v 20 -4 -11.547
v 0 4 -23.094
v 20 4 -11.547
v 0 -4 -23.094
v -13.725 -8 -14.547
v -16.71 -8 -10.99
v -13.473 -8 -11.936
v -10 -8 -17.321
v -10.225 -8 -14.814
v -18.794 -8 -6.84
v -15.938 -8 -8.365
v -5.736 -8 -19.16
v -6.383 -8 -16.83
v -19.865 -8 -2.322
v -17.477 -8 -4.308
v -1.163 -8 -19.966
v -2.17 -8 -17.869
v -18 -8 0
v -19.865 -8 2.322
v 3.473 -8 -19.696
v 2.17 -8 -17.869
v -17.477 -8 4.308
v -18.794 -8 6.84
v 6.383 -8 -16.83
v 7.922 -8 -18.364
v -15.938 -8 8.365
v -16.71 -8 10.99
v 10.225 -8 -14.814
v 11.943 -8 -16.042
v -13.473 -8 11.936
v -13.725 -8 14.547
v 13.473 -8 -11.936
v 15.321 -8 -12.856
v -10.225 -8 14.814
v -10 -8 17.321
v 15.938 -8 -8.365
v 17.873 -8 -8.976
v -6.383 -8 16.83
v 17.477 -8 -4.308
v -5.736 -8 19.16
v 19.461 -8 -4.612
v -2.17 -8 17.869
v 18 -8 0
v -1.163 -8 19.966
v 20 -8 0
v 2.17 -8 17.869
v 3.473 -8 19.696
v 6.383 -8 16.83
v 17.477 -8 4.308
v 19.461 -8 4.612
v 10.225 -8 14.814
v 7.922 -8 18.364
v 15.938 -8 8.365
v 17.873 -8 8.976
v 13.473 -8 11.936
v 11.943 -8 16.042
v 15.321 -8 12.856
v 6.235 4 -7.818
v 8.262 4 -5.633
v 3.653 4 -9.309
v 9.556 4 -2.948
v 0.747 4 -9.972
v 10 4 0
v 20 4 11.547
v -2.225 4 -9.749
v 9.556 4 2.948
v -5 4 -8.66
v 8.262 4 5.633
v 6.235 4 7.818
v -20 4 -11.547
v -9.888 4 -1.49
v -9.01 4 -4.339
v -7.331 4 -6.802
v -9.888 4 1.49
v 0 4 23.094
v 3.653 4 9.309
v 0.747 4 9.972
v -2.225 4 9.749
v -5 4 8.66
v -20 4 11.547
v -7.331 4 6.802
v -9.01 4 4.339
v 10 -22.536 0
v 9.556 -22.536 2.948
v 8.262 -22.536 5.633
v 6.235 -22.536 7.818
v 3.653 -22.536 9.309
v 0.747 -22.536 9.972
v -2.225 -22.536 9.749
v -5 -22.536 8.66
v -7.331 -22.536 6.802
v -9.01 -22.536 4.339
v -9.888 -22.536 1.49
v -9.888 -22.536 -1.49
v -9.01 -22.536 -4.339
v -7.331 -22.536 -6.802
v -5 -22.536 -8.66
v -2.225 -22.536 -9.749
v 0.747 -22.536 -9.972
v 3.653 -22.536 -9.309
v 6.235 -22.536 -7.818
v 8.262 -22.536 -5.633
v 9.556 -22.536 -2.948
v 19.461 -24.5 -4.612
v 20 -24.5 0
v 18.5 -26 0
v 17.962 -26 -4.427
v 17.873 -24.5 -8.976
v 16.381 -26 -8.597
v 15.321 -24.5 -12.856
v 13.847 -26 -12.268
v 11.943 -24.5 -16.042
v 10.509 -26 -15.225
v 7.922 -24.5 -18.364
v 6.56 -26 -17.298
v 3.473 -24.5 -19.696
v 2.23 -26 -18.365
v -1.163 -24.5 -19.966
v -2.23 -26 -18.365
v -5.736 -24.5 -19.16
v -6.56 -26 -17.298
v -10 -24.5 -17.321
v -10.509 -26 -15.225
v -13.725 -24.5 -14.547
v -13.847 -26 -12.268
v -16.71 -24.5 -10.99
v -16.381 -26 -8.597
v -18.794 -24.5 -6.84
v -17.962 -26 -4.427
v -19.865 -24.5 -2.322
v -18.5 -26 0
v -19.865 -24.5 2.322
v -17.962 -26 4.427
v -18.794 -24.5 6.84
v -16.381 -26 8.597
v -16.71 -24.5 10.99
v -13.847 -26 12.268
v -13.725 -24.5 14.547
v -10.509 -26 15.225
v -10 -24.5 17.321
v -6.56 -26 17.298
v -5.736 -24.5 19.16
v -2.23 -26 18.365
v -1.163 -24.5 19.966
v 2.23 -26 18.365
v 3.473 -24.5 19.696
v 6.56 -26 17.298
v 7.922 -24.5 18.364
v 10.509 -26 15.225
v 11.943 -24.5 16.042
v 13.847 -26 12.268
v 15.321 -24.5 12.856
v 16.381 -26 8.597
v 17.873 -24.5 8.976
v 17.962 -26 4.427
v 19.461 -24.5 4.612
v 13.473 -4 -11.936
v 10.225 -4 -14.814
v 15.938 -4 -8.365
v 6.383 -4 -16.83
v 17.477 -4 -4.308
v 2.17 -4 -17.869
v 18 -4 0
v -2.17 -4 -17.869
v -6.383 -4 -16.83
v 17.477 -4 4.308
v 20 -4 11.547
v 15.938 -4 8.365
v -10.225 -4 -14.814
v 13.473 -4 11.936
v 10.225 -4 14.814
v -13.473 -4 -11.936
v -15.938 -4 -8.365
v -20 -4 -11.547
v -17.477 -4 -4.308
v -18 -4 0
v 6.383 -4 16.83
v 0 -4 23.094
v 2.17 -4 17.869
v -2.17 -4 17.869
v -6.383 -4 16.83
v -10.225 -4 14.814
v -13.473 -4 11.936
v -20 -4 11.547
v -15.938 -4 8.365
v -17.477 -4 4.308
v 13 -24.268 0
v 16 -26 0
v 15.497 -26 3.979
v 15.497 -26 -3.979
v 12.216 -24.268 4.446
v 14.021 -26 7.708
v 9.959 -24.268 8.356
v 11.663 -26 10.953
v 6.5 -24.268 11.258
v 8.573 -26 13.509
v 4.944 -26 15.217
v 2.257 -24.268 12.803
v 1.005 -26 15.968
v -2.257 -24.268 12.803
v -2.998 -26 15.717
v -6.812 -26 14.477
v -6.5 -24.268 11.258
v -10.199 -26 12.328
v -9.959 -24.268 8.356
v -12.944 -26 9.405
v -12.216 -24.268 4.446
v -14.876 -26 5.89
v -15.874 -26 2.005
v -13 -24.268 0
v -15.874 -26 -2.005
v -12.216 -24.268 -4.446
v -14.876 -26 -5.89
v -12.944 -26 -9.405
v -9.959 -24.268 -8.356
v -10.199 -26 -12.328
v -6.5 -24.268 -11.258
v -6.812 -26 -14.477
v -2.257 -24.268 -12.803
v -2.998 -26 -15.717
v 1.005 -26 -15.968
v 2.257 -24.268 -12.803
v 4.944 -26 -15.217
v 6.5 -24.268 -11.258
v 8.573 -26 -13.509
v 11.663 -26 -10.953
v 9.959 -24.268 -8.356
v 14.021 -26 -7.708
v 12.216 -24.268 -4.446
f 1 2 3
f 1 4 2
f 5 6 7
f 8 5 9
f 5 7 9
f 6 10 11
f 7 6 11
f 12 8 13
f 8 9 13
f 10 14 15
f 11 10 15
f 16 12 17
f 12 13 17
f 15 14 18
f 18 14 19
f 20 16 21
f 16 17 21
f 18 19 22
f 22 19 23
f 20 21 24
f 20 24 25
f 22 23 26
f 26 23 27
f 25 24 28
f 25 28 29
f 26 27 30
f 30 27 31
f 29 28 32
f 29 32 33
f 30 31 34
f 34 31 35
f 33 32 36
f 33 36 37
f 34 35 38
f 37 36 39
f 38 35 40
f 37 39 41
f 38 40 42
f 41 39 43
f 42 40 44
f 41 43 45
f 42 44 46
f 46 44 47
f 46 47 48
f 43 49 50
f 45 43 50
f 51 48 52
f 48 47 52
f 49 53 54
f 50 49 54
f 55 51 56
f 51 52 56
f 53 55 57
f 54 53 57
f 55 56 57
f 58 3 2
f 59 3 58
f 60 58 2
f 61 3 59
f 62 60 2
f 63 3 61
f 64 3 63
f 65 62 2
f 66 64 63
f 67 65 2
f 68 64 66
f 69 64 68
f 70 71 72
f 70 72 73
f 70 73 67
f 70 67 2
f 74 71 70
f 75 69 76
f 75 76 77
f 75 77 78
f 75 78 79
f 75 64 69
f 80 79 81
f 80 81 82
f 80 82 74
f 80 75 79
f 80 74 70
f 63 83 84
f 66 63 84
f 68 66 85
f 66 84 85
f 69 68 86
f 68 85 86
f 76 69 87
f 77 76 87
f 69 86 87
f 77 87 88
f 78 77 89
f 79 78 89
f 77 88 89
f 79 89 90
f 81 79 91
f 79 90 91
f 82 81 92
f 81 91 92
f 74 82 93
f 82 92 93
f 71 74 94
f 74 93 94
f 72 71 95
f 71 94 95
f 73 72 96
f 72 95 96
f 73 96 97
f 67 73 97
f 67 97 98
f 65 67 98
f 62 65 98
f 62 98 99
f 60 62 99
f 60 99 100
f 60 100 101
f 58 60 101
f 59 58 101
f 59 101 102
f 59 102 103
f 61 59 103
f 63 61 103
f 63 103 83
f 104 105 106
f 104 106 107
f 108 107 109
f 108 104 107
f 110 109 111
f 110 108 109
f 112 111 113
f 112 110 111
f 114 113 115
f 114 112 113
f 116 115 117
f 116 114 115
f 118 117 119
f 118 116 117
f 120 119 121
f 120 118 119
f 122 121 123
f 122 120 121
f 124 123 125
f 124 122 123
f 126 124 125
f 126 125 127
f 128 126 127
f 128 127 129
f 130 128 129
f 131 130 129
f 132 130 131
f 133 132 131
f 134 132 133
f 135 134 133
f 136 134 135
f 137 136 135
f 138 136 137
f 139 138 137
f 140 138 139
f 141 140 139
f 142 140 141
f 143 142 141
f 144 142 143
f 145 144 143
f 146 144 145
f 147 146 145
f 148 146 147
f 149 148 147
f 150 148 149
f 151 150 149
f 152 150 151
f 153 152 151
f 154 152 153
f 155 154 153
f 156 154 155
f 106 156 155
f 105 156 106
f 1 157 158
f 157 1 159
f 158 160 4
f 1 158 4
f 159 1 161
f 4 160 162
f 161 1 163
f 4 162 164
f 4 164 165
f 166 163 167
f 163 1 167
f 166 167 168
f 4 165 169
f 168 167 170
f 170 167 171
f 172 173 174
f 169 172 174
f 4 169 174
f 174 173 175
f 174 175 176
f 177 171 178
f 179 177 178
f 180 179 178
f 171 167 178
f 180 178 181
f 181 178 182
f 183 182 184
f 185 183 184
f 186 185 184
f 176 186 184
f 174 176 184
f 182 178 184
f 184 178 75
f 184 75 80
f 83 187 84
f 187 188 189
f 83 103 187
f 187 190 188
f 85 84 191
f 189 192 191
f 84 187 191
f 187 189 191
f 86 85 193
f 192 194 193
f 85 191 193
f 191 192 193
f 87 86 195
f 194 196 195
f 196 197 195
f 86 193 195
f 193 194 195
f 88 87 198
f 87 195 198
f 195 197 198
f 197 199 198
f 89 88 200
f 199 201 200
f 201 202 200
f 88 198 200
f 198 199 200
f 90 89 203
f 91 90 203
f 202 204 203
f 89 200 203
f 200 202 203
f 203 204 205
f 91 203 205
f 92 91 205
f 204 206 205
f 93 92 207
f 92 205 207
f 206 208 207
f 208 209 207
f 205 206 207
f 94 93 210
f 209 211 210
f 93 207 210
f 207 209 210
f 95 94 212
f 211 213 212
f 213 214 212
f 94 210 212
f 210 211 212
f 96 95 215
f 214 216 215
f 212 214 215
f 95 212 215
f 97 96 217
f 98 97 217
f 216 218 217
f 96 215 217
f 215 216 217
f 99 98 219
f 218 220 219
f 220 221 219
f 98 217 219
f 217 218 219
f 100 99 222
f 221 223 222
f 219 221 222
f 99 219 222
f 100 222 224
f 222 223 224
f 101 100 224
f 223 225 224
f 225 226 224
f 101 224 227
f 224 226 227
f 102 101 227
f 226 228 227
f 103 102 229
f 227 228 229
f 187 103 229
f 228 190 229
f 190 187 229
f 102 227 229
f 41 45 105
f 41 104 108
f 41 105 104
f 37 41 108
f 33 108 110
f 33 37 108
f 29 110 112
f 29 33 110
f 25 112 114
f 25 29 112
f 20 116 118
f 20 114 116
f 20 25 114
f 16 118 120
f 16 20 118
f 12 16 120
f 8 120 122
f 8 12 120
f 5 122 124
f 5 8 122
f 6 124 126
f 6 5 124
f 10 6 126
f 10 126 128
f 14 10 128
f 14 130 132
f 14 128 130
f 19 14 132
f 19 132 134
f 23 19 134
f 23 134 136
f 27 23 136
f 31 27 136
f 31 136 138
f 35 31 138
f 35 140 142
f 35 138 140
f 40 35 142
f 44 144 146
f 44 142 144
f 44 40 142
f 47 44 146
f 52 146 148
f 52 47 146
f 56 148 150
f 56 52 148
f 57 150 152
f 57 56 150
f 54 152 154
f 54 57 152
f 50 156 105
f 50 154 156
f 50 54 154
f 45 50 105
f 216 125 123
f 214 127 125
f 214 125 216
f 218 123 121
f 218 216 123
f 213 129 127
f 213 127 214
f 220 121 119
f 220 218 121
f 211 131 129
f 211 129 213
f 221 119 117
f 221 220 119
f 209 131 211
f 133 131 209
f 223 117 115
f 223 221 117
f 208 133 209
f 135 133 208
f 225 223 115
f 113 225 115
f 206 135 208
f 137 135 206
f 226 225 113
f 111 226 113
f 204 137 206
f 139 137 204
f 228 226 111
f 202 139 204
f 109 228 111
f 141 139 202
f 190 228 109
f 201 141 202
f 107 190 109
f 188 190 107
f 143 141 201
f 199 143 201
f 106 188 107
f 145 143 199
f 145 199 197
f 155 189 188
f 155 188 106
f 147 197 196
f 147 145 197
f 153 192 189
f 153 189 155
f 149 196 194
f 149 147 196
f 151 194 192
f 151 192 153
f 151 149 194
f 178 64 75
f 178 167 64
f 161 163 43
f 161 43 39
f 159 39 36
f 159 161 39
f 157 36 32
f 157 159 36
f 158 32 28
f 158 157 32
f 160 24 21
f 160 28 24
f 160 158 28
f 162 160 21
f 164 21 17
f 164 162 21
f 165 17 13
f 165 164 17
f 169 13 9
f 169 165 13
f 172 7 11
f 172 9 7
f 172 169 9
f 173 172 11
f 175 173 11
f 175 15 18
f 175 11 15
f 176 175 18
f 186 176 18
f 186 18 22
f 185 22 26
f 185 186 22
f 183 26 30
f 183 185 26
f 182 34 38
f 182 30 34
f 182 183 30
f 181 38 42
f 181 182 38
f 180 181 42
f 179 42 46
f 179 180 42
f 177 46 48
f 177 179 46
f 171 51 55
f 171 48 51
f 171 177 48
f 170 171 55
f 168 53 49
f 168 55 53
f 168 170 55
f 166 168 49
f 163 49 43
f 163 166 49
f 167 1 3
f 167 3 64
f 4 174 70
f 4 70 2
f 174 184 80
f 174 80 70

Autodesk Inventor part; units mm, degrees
ref_plane "YZ Plane" through (0, 0, 0) normal (1, 0, 0) x (0, 1, 0)
ref_plane "XZ Plane" through (0, 0, 0) normal (0, 1, 0) x (-1, 0, 0)
ref_plane "XY Plane" through (0, 0, 0) normal (0, 0, 1) x (1, 0, 0)
sketch "草图1" plane through (0, 0, 0) normal (0, 1, 0) x (-1, 0, 0)
  line L0 (20, -11.547) -> (0, -23.094)
  line L1 (0, -23.094) -> (-20, -11.547)
  line L2 (-20, -11.547) -> (-20, 11.547)
  line L3 (-20, 11.547) -> (0, 23.094)
  line L4 (0, 23.094) -> (20, 11.547)
  line L5 (20, 11.547) -> (20, -11.547)
  point P0 (0, 0)
  point P1 (0, 0)
  dimension "d0" = 40
extrude "拉伸1" add sketch "草图1" along normal mid plane 8
sketch "草图4" plane through (0, -4, 0) normal (0, -1, 0) x (1, 0, 0)
  circle A0 centre (0, 0) radius 18
  dimension "d18" = 36
extrude "拉伸3" add sketch "草图4" along normal blind 4
sketch "草图5" plane through (0, -8, 0) normal (0, -1, 0) x (1, 0, 0)
  circle A0 centre (0, 0) radius 20
  dimension "d21" = 40
extrude "拉伸4" add sketch "草图5" along normal blind 18
thread "螺纹1" size "M40x3" class "6g" standard "GB Metric profile" full length
sketch "草图6" plane through (0, 0, 0) normal (0, 0, 1) x (1, 0, 0)
  line L0 (0, 4) -> (20, 4) projected
  line L1 (-20, -26) -> (20, -26) projected
  line L2 (0, 11.1674) -> (0, -43.9009)
  line L3 (10, -22.5359) -> (16, -26)
  line L4 (10, 4) -> (10, -22.5359)
  line L5 (20, -4) -> (20, 4) projected
  line L6 (0, 4) -> (20, 4) projected
  line L7 (0, -4) -> (0, 4) projected
  line L8 (20, -4) -> (0, -4) projected
  line L9 (-20, -26) -> (20, -26) projected
  line L10 (-20, -8) -> (20, -8) projected
  point P0 (0, 0)
  point P1 (0, -26)
  dimension "d28" = 60
  dimension "d29" = 16
revolve "旋转2" cut sketch "草图6" angle 360 about axis through (0, 11.1674, 0) along (0, -1, 0) contours L0 L4 L8 L2 | L8 L4 L10 L2 | L10 L4 L3 L1 L2
chamfer "倒角2" distance 1.5 angle 45 1 edges at (-20, -26, 0)
properties part number "螺套" material "不锈钢"
